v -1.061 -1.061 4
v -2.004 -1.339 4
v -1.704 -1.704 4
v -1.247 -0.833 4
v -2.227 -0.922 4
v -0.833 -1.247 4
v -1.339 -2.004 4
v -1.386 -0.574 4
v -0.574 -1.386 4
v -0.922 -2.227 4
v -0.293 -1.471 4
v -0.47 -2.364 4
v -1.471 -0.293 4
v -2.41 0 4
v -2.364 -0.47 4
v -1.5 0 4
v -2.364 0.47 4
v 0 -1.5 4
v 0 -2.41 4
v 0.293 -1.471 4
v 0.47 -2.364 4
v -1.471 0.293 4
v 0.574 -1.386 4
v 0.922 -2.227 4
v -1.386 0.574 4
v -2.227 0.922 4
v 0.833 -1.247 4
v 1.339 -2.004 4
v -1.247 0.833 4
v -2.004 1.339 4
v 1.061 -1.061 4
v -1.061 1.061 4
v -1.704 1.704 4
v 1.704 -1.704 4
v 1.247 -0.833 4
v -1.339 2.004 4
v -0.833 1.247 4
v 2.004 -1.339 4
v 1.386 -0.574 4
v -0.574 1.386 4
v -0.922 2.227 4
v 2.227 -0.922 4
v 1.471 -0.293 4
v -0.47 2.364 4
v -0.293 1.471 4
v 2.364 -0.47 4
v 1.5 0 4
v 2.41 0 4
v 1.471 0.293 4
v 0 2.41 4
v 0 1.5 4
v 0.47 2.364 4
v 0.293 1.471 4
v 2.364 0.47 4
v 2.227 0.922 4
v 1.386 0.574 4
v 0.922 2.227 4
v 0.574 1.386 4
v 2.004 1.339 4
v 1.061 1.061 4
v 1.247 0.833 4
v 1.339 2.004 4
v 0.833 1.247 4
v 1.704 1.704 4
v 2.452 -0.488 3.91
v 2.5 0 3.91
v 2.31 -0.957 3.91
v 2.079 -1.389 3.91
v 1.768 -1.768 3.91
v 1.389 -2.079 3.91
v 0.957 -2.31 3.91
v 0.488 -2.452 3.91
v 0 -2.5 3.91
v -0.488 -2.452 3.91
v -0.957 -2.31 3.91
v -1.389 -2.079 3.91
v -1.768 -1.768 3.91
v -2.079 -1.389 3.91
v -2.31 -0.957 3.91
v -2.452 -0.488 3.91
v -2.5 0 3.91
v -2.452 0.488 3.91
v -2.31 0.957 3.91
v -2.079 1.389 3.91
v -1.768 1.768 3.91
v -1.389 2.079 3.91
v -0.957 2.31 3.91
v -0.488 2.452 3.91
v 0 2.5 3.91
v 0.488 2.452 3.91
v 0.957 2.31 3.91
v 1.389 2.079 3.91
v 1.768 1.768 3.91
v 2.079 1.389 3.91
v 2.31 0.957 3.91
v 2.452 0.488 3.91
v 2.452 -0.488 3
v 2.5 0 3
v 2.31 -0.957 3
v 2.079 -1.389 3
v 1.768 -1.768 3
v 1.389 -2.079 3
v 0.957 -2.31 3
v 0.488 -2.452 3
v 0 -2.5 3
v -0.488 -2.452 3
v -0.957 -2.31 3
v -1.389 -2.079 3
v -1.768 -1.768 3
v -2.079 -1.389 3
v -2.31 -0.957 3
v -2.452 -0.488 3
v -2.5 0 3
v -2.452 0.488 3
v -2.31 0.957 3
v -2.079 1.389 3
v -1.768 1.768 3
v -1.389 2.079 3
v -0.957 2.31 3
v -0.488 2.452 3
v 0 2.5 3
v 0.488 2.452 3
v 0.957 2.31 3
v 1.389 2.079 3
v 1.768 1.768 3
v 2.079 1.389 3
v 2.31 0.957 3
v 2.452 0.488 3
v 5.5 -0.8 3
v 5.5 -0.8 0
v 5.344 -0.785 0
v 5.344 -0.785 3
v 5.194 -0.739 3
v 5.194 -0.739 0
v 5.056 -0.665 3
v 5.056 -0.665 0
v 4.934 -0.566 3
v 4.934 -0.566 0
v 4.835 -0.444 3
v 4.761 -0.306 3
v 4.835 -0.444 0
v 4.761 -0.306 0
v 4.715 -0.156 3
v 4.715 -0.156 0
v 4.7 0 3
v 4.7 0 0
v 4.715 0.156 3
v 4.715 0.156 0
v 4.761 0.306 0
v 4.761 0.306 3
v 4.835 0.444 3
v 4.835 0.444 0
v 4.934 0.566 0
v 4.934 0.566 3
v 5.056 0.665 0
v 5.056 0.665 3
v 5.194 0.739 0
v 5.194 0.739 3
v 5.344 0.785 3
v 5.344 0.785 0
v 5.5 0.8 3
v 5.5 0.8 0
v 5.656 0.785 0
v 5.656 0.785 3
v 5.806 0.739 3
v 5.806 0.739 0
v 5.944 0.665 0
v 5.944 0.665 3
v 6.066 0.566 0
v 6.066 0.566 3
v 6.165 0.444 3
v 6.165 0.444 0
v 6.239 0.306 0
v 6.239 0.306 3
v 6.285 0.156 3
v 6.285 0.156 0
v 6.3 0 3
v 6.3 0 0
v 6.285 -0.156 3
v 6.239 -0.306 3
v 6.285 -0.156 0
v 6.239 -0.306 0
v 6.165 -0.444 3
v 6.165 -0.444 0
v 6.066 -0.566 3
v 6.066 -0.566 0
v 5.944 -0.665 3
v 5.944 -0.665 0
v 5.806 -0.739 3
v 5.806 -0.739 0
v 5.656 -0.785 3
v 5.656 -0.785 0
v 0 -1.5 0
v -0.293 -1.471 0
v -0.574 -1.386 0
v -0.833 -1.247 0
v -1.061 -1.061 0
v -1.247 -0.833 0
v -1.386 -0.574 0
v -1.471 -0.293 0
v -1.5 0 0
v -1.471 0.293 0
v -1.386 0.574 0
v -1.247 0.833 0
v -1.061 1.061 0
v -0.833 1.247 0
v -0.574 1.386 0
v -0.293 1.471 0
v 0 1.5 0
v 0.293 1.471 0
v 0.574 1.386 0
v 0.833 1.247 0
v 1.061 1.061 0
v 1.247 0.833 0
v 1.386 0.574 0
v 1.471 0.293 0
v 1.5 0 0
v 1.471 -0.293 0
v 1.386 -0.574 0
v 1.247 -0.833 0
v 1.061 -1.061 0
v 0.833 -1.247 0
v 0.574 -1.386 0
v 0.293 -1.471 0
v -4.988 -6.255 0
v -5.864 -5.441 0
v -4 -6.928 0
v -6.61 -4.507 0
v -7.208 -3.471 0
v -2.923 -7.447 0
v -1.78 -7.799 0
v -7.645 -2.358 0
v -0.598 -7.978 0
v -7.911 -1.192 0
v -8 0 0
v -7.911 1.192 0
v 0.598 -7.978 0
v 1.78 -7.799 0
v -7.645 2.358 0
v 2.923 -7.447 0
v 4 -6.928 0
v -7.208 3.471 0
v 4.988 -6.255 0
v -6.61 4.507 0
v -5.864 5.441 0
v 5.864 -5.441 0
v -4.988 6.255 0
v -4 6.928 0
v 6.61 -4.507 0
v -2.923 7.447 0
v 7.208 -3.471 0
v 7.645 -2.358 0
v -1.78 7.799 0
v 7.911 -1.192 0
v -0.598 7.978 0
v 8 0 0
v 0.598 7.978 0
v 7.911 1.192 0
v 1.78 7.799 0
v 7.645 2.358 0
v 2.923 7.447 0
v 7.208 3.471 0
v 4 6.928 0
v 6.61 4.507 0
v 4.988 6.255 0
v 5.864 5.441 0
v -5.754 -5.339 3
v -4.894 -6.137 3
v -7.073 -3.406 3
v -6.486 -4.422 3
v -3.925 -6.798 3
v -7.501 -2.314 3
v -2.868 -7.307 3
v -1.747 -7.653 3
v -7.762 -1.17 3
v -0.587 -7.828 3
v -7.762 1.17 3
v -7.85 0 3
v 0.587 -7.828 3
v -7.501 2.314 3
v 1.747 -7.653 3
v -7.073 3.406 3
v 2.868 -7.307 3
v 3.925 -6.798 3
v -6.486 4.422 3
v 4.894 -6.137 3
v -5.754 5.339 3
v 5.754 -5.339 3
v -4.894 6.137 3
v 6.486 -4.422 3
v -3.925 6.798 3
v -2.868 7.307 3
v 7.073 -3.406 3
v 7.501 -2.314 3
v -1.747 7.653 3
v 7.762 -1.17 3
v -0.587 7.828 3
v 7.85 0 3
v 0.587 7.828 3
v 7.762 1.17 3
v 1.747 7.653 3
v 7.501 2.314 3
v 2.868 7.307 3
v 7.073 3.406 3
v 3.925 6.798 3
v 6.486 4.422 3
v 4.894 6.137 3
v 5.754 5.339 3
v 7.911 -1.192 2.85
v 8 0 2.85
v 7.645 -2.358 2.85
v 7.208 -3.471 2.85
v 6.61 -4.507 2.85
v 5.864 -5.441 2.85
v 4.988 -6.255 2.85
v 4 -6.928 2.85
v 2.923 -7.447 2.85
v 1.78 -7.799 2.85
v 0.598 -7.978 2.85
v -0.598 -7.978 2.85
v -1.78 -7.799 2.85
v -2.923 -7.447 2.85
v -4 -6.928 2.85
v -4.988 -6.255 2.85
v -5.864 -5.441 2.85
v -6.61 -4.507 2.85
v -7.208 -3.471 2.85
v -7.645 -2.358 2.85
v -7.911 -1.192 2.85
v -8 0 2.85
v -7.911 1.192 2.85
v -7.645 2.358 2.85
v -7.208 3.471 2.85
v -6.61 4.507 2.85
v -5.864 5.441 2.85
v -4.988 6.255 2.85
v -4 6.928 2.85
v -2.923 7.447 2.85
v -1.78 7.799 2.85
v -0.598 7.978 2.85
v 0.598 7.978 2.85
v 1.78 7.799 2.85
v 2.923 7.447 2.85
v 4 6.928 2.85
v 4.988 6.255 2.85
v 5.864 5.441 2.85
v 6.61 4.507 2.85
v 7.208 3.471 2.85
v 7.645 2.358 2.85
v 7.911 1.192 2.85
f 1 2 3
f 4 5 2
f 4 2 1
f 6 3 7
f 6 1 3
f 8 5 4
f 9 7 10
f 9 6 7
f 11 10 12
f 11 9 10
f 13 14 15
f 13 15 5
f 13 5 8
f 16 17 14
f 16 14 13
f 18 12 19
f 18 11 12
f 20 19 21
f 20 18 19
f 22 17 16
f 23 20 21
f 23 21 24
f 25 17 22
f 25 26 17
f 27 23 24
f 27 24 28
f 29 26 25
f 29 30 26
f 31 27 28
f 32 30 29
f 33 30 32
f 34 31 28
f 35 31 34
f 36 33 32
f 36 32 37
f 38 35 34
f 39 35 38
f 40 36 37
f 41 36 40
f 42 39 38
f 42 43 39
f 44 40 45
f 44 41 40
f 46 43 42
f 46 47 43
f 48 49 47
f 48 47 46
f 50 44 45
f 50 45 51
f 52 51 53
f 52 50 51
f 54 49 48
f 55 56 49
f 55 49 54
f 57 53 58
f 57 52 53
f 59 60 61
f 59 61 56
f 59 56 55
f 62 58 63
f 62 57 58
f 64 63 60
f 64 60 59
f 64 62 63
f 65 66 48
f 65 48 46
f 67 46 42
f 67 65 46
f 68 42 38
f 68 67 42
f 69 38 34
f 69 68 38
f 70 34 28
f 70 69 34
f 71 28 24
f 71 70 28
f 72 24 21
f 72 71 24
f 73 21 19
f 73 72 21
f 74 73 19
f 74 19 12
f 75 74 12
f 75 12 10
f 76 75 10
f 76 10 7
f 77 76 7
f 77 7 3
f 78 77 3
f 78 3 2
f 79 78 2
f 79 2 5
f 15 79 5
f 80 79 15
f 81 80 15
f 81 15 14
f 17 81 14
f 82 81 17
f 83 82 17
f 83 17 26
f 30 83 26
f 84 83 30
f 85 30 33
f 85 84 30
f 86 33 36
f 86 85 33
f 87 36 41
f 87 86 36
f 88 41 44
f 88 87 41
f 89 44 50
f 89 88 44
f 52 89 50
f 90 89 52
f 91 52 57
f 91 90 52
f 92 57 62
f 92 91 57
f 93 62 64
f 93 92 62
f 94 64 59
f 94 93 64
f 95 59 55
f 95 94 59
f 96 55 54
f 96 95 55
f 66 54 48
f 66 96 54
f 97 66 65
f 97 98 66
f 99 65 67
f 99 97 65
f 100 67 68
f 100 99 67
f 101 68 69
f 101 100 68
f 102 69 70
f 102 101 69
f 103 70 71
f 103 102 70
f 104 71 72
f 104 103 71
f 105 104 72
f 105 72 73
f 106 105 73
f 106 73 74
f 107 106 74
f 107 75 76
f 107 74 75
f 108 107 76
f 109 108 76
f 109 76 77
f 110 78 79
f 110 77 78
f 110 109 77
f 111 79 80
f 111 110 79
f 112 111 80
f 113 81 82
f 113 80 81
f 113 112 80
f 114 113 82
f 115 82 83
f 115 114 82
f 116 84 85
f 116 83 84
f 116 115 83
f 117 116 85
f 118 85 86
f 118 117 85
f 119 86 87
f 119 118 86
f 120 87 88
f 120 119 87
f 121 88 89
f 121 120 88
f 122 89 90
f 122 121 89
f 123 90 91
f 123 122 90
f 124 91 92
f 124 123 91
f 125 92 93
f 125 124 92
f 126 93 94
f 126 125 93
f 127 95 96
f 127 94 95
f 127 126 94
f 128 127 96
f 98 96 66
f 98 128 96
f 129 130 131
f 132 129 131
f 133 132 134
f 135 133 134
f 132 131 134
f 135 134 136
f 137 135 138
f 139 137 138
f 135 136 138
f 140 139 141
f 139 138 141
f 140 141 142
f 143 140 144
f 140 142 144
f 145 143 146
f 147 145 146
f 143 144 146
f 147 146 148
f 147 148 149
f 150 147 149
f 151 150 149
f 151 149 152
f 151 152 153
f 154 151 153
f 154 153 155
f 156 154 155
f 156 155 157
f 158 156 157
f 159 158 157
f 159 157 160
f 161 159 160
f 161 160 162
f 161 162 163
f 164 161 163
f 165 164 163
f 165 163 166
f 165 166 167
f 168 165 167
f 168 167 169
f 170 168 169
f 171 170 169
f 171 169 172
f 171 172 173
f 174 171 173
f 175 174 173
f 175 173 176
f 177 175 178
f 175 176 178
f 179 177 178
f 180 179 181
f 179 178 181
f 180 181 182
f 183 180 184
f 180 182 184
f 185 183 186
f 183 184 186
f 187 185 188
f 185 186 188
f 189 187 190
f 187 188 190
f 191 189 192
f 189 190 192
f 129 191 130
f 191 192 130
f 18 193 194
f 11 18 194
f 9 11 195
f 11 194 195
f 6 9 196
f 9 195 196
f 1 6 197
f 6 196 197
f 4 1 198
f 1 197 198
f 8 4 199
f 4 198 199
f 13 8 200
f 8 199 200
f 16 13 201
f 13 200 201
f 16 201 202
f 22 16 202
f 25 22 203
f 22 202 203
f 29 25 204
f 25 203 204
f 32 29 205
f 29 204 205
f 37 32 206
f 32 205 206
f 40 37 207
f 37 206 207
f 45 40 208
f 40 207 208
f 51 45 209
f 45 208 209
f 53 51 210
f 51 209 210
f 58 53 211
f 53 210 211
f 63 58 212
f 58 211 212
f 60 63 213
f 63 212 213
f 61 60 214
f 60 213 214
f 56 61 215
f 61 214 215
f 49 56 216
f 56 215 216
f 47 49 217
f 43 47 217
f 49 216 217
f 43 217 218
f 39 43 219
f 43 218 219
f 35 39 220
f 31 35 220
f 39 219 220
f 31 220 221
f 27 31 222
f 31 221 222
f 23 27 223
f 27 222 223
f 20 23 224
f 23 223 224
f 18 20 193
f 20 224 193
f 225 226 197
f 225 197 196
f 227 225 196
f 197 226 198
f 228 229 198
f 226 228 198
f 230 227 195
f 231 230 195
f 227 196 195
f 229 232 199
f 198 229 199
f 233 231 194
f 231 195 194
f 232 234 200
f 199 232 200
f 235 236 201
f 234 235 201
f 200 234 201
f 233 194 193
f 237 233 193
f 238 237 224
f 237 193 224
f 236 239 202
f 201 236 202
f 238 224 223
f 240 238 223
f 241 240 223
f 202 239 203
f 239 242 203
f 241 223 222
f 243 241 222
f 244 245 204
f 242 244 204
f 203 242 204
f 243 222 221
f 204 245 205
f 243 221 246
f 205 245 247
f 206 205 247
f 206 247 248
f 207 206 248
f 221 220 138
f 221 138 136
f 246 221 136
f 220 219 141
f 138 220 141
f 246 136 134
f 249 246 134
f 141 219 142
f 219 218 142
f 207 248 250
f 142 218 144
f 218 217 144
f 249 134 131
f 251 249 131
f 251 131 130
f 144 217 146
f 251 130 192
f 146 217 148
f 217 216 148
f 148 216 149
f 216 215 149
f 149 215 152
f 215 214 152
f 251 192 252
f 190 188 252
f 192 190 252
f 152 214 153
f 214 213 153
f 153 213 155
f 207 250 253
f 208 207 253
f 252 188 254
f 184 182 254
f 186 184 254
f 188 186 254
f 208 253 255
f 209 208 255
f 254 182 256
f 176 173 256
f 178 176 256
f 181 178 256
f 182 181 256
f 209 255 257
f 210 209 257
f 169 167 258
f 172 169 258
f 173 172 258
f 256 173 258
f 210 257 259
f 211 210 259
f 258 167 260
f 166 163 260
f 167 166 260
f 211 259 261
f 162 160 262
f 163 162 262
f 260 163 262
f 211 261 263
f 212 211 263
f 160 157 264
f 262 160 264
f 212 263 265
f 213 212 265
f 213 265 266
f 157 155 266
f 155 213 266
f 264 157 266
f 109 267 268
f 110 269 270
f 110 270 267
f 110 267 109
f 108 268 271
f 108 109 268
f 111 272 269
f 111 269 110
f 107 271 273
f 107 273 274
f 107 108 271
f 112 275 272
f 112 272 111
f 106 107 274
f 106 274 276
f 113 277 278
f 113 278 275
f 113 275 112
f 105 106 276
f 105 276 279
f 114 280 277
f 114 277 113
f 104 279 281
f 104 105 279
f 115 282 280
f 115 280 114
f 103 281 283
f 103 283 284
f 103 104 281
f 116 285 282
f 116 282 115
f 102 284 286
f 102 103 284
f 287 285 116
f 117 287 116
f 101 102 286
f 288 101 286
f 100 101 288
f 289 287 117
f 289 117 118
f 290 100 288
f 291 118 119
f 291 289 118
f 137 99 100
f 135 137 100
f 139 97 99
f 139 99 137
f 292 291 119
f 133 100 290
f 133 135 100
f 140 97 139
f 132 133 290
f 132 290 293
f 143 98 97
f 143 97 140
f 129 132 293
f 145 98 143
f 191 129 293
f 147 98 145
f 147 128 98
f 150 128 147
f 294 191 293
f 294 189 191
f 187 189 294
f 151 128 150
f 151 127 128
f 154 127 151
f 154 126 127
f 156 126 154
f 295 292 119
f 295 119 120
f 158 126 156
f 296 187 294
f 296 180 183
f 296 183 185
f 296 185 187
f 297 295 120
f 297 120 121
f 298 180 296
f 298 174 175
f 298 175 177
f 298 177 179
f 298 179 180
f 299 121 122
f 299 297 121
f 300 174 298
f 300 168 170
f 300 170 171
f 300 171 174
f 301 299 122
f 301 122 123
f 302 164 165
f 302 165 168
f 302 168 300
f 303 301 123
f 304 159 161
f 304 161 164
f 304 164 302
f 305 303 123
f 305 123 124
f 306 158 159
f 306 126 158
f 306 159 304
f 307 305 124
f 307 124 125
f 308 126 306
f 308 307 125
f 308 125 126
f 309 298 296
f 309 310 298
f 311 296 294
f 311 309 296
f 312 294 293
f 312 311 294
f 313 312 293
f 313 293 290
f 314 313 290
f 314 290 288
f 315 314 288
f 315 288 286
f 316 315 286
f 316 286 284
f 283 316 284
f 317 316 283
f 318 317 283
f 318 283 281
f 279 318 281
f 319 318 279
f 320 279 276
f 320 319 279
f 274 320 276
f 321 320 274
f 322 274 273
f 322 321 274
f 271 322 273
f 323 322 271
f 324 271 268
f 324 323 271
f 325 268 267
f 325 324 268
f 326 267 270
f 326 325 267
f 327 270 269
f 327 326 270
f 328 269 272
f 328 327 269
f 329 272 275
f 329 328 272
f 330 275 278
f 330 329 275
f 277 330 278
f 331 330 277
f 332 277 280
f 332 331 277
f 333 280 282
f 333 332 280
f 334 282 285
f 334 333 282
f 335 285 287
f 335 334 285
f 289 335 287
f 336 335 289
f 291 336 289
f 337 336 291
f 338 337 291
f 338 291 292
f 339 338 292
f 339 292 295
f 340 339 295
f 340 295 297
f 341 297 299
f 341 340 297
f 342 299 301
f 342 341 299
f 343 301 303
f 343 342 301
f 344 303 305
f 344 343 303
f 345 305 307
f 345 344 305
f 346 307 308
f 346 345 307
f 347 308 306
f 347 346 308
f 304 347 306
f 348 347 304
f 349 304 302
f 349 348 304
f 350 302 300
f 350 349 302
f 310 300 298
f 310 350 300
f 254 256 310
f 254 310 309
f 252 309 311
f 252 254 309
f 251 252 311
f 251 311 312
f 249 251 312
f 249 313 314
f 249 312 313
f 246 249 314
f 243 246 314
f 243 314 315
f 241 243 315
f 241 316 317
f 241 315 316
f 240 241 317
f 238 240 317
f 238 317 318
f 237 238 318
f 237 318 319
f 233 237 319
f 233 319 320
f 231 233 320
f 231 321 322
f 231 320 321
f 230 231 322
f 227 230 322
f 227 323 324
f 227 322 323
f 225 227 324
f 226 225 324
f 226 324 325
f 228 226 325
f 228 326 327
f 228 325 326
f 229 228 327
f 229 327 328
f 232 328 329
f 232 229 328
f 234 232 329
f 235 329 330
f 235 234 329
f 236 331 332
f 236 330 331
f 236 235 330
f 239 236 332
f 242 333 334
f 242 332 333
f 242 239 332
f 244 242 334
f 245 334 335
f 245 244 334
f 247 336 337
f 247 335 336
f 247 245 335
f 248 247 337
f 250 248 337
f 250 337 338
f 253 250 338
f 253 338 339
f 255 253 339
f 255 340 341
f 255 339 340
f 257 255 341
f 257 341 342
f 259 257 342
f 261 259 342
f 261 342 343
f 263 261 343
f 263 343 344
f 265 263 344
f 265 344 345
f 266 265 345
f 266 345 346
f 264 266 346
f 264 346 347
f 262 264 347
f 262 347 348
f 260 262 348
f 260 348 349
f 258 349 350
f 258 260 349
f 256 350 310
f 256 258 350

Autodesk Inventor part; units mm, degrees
ref_plane "YZ Plane" through (0, 0, 0) normal (1, 0, 0) x (0, 1, 0)
ref_plane "XZ Plane" through (0, 0, 0) normal (0, 1, 0) x (-1, 0, 0)
ref_plane "XY Plane" through (0, 0, 0) normal (0, 0, 1) x (1, 0, 0)
sketch "Skizze1" plane through (0, 0, 0) normal (0, 0, 1) x (1, 0, 0)
  circle A0 centre (0, 0) radius 8
  dimension "d0" = 16
extrude "Extrusion1" add sketch "Skizze1" along normal blind 3
sketch "Skizze2" plane through (0, 0, 3) normal (0, 0, 1) x (1, 0, 0)
  circle A0 centre (0, 0) radius 2.5
  dimension "d3" = 5
extrude "Extrusion2" add sketch "Skizze2" along normal blind 1
sketch "Skizze3" plane through (0, 0, 4) normal (0, 0, 1) x (1, 0, 0)
  circle A0 centre (0, 0) radius 2.5 projected
hole "Bohrung1" at (0, 0, 4) direction (0, 0, -1) diameter 3 depth 4
sketch "Skizze4" plane through (0, 0, 3) normal (0, 0, 1) x (1, 0, 0)
  point P0 (0, 0)
  point P1 (5.5, 0)
  dimension "d20" = 5.5
hole "Bohrung2" at (5.5, 0, 3) direction (0, 0, -1) diameter 1.6 end through all
chamfer "Fasen1" distance 0.15 angle 45 1 edges at (-8, 0, 3)
chamfer "Fasen2" distance 0.09 angle 45 1 edges at (-2.5, 0, 4)
properties part number "Kurbel" material "Gold"
